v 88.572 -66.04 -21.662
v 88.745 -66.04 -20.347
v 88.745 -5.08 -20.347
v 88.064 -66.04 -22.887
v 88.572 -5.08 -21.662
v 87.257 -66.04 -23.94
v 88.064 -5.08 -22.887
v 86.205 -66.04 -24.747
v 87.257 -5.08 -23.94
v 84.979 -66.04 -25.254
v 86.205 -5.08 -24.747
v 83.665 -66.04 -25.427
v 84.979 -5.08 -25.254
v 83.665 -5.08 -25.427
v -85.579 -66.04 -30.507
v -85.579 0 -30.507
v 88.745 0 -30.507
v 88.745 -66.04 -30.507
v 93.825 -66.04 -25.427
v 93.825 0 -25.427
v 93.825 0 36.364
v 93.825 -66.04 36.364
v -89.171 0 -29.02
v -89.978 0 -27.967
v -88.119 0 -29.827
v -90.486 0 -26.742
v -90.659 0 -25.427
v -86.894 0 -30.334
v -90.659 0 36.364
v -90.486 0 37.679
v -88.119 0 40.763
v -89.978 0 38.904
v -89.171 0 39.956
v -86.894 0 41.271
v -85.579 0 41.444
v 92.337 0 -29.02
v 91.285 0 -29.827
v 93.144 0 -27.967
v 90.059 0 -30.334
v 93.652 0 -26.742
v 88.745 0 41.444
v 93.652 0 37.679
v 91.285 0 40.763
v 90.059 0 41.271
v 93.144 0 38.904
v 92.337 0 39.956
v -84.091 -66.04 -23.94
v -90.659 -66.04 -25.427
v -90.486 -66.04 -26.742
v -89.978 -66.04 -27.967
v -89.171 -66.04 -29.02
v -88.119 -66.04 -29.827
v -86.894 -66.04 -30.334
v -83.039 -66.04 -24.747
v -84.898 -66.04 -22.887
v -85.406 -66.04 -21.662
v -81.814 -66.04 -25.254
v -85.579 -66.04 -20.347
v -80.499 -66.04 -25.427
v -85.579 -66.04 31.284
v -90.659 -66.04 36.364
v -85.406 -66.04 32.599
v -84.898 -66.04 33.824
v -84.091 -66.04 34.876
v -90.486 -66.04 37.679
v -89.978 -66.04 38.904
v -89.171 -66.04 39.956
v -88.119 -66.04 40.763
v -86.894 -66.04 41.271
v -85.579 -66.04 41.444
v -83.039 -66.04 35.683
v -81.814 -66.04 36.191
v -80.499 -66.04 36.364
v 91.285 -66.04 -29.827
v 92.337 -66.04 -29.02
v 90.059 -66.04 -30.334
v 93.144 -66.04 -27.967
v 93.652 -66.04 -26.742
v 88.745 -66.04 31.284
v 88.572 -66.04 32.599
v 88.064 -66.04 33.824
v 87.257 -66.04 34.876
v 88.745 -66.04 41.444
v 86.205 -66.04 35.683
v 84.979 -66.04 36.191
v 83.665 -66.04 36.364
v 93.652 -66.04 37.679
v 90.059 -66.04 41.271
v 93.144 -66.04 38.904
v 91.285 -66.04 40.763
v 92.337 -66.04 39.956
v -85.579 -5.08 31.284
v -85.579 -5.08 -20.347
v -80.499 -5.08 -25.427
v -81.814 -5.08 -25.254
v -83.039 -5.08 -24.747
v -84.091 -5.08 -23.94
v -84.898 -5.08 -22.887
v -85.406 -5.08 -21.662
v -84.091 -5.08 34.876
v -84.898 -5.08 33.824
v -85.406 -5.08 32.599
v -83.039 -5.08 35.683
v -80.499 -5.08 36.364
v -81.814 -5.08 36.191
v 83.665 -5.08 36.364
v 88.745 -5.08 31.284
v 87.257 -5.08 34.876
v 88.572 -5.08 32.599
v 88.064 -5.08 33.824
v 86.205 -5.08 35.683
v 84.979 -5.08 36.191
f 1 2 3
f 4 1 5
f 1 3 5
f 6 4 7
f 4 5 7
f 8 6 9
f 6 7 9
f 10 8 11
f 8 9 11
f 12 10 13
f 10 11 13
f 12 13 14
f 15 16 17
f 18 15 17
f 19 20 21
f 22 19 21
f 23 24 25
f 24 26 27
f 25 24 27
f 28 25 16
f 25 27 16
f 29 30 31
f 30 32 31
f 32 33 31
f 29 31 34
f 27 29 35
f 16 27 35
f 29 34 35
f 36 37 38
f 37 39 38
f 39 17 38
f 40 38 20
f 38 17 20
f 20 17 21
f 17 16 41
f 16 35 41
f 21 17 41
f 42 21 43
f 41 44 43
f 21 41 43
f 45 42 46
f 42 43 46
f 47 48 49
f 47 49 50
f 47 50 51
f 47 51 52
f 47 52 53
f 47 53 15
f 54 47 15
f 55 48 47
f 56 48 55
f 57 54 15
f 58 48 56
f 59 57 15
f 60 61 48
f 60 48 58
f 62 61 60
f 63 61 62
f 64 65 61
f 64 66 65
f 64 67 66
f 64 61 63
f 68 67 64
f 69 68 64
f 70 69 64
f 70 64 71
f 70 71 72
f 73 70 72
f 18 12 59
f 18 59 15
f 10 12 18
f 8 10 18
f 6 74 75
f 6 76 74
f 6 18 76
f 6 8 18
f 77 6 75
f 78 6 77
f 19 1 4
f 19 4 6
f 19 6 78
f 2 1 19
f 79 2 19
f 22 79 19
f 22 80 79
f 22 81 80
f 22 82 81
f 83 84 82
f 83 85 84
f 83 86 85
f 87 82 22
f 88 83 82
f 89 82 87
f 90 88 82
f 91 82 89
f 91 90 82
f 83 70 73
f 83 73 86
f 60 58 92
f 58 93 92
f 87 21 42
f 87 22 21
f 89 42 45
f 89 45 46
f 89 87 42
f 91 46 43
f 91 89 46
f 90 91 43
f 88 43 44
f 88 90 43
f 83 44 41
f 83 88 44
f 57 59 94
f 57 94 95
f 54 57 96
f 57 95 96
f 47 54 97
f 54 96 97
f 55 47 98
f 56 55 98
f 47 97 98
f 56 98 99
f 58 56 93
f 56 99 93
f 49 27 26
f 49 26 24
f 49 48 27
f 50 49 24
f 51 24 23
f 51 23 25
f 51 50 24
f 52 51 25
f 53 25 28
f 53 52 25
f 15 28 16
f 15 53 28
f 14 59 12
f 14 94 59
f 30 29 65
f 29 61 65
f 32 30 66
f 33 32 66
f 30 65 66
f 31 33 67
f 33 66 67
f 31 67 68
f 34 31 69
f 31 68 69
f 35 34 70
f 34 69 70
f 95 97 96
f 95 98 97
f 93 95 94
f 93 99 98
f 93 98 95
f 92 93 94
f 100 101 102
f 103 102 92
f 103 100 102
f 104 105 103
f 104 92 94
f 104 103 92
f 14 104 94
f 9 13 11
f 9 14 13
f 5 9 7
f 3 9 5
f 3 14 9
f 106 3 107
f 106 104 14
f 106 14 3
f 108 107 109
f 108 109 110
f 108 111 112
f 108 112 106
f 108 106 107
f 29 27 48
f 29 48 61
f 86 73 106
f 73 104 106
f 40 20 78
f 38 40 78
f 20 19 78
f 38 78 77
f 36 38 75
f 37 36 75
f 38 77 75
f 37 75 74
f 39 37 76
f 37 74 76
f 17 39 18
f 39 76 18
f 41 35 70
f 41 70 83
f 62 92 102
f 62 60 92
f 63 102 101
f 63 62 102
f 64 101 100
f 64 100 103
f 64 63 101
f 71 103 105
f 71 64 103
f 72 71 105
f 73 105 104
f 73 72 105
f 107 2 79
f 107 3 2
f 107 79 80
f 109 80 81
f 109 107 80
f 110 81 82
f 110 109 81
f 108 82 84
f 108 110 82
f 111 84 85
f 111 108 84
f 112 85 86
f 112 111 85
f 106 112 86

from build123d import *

# Parameters (mm, degrees)
F0_W     = 184.4834834337
F0_H     = 71.9514358789
F1_DEPTH = 66.04
F2_T     = -5.08
F3_DEPTH = 33.02
F4_R     = 5.08
F5_R     = 5.08


with BuildPart() as f1:
    # F0 (on Front) → F1 (new body)
    with BuildSketch(Plane.XZ):
        with Locations((1.5829280019, 5.4683079943)):
            Rectangle(F0_W, F0_H)
    extrude(amount=F1_DEPTH)

    # F2
    f2_openings = [f1.faces().sort_by_distance(p)[0] for p in [
        (1.582928, -66.04, 5.468308),
    ]]
    offset(amount=F2_T, openings=f2_openings)

    # F3 (cut): a face of the model
    f3_faces = [f1.faces().sort_by_distance(p)[0] for p in [
        (1.5829280019, -5.08, 5.4683079943),
    ]]
    extrude(f3_faces, amount=F3_DEPTH, mode=Mode.SUBTRACT)

    # F4
    f4_edges = [f1.edges().sort_by_distance(p)[0] for p in [
        (-90.658814, -33.02, 41.444026),
        (93.82467, -33.02, 41.444026),
        (93.82467, -33.02, -30.50741),
        (-90.658814, -33.02, -30.50741),
    ]]
    fillet(f4_edges, radius=F4_R)

    # F5
    f5_edges = [f1.edges().sort_by_distance(p)[0] for p in [
        (-85.578814, -35.56, -25.42741),
        (88.74467, -35.56, -25.42741),
        (88.74467, -35.56, 36.364026),
        (-85.578814, -35.56, 36.364026),
    ]]
    fillet(f5_edges, radius=F5_R)


solid = f1.part
